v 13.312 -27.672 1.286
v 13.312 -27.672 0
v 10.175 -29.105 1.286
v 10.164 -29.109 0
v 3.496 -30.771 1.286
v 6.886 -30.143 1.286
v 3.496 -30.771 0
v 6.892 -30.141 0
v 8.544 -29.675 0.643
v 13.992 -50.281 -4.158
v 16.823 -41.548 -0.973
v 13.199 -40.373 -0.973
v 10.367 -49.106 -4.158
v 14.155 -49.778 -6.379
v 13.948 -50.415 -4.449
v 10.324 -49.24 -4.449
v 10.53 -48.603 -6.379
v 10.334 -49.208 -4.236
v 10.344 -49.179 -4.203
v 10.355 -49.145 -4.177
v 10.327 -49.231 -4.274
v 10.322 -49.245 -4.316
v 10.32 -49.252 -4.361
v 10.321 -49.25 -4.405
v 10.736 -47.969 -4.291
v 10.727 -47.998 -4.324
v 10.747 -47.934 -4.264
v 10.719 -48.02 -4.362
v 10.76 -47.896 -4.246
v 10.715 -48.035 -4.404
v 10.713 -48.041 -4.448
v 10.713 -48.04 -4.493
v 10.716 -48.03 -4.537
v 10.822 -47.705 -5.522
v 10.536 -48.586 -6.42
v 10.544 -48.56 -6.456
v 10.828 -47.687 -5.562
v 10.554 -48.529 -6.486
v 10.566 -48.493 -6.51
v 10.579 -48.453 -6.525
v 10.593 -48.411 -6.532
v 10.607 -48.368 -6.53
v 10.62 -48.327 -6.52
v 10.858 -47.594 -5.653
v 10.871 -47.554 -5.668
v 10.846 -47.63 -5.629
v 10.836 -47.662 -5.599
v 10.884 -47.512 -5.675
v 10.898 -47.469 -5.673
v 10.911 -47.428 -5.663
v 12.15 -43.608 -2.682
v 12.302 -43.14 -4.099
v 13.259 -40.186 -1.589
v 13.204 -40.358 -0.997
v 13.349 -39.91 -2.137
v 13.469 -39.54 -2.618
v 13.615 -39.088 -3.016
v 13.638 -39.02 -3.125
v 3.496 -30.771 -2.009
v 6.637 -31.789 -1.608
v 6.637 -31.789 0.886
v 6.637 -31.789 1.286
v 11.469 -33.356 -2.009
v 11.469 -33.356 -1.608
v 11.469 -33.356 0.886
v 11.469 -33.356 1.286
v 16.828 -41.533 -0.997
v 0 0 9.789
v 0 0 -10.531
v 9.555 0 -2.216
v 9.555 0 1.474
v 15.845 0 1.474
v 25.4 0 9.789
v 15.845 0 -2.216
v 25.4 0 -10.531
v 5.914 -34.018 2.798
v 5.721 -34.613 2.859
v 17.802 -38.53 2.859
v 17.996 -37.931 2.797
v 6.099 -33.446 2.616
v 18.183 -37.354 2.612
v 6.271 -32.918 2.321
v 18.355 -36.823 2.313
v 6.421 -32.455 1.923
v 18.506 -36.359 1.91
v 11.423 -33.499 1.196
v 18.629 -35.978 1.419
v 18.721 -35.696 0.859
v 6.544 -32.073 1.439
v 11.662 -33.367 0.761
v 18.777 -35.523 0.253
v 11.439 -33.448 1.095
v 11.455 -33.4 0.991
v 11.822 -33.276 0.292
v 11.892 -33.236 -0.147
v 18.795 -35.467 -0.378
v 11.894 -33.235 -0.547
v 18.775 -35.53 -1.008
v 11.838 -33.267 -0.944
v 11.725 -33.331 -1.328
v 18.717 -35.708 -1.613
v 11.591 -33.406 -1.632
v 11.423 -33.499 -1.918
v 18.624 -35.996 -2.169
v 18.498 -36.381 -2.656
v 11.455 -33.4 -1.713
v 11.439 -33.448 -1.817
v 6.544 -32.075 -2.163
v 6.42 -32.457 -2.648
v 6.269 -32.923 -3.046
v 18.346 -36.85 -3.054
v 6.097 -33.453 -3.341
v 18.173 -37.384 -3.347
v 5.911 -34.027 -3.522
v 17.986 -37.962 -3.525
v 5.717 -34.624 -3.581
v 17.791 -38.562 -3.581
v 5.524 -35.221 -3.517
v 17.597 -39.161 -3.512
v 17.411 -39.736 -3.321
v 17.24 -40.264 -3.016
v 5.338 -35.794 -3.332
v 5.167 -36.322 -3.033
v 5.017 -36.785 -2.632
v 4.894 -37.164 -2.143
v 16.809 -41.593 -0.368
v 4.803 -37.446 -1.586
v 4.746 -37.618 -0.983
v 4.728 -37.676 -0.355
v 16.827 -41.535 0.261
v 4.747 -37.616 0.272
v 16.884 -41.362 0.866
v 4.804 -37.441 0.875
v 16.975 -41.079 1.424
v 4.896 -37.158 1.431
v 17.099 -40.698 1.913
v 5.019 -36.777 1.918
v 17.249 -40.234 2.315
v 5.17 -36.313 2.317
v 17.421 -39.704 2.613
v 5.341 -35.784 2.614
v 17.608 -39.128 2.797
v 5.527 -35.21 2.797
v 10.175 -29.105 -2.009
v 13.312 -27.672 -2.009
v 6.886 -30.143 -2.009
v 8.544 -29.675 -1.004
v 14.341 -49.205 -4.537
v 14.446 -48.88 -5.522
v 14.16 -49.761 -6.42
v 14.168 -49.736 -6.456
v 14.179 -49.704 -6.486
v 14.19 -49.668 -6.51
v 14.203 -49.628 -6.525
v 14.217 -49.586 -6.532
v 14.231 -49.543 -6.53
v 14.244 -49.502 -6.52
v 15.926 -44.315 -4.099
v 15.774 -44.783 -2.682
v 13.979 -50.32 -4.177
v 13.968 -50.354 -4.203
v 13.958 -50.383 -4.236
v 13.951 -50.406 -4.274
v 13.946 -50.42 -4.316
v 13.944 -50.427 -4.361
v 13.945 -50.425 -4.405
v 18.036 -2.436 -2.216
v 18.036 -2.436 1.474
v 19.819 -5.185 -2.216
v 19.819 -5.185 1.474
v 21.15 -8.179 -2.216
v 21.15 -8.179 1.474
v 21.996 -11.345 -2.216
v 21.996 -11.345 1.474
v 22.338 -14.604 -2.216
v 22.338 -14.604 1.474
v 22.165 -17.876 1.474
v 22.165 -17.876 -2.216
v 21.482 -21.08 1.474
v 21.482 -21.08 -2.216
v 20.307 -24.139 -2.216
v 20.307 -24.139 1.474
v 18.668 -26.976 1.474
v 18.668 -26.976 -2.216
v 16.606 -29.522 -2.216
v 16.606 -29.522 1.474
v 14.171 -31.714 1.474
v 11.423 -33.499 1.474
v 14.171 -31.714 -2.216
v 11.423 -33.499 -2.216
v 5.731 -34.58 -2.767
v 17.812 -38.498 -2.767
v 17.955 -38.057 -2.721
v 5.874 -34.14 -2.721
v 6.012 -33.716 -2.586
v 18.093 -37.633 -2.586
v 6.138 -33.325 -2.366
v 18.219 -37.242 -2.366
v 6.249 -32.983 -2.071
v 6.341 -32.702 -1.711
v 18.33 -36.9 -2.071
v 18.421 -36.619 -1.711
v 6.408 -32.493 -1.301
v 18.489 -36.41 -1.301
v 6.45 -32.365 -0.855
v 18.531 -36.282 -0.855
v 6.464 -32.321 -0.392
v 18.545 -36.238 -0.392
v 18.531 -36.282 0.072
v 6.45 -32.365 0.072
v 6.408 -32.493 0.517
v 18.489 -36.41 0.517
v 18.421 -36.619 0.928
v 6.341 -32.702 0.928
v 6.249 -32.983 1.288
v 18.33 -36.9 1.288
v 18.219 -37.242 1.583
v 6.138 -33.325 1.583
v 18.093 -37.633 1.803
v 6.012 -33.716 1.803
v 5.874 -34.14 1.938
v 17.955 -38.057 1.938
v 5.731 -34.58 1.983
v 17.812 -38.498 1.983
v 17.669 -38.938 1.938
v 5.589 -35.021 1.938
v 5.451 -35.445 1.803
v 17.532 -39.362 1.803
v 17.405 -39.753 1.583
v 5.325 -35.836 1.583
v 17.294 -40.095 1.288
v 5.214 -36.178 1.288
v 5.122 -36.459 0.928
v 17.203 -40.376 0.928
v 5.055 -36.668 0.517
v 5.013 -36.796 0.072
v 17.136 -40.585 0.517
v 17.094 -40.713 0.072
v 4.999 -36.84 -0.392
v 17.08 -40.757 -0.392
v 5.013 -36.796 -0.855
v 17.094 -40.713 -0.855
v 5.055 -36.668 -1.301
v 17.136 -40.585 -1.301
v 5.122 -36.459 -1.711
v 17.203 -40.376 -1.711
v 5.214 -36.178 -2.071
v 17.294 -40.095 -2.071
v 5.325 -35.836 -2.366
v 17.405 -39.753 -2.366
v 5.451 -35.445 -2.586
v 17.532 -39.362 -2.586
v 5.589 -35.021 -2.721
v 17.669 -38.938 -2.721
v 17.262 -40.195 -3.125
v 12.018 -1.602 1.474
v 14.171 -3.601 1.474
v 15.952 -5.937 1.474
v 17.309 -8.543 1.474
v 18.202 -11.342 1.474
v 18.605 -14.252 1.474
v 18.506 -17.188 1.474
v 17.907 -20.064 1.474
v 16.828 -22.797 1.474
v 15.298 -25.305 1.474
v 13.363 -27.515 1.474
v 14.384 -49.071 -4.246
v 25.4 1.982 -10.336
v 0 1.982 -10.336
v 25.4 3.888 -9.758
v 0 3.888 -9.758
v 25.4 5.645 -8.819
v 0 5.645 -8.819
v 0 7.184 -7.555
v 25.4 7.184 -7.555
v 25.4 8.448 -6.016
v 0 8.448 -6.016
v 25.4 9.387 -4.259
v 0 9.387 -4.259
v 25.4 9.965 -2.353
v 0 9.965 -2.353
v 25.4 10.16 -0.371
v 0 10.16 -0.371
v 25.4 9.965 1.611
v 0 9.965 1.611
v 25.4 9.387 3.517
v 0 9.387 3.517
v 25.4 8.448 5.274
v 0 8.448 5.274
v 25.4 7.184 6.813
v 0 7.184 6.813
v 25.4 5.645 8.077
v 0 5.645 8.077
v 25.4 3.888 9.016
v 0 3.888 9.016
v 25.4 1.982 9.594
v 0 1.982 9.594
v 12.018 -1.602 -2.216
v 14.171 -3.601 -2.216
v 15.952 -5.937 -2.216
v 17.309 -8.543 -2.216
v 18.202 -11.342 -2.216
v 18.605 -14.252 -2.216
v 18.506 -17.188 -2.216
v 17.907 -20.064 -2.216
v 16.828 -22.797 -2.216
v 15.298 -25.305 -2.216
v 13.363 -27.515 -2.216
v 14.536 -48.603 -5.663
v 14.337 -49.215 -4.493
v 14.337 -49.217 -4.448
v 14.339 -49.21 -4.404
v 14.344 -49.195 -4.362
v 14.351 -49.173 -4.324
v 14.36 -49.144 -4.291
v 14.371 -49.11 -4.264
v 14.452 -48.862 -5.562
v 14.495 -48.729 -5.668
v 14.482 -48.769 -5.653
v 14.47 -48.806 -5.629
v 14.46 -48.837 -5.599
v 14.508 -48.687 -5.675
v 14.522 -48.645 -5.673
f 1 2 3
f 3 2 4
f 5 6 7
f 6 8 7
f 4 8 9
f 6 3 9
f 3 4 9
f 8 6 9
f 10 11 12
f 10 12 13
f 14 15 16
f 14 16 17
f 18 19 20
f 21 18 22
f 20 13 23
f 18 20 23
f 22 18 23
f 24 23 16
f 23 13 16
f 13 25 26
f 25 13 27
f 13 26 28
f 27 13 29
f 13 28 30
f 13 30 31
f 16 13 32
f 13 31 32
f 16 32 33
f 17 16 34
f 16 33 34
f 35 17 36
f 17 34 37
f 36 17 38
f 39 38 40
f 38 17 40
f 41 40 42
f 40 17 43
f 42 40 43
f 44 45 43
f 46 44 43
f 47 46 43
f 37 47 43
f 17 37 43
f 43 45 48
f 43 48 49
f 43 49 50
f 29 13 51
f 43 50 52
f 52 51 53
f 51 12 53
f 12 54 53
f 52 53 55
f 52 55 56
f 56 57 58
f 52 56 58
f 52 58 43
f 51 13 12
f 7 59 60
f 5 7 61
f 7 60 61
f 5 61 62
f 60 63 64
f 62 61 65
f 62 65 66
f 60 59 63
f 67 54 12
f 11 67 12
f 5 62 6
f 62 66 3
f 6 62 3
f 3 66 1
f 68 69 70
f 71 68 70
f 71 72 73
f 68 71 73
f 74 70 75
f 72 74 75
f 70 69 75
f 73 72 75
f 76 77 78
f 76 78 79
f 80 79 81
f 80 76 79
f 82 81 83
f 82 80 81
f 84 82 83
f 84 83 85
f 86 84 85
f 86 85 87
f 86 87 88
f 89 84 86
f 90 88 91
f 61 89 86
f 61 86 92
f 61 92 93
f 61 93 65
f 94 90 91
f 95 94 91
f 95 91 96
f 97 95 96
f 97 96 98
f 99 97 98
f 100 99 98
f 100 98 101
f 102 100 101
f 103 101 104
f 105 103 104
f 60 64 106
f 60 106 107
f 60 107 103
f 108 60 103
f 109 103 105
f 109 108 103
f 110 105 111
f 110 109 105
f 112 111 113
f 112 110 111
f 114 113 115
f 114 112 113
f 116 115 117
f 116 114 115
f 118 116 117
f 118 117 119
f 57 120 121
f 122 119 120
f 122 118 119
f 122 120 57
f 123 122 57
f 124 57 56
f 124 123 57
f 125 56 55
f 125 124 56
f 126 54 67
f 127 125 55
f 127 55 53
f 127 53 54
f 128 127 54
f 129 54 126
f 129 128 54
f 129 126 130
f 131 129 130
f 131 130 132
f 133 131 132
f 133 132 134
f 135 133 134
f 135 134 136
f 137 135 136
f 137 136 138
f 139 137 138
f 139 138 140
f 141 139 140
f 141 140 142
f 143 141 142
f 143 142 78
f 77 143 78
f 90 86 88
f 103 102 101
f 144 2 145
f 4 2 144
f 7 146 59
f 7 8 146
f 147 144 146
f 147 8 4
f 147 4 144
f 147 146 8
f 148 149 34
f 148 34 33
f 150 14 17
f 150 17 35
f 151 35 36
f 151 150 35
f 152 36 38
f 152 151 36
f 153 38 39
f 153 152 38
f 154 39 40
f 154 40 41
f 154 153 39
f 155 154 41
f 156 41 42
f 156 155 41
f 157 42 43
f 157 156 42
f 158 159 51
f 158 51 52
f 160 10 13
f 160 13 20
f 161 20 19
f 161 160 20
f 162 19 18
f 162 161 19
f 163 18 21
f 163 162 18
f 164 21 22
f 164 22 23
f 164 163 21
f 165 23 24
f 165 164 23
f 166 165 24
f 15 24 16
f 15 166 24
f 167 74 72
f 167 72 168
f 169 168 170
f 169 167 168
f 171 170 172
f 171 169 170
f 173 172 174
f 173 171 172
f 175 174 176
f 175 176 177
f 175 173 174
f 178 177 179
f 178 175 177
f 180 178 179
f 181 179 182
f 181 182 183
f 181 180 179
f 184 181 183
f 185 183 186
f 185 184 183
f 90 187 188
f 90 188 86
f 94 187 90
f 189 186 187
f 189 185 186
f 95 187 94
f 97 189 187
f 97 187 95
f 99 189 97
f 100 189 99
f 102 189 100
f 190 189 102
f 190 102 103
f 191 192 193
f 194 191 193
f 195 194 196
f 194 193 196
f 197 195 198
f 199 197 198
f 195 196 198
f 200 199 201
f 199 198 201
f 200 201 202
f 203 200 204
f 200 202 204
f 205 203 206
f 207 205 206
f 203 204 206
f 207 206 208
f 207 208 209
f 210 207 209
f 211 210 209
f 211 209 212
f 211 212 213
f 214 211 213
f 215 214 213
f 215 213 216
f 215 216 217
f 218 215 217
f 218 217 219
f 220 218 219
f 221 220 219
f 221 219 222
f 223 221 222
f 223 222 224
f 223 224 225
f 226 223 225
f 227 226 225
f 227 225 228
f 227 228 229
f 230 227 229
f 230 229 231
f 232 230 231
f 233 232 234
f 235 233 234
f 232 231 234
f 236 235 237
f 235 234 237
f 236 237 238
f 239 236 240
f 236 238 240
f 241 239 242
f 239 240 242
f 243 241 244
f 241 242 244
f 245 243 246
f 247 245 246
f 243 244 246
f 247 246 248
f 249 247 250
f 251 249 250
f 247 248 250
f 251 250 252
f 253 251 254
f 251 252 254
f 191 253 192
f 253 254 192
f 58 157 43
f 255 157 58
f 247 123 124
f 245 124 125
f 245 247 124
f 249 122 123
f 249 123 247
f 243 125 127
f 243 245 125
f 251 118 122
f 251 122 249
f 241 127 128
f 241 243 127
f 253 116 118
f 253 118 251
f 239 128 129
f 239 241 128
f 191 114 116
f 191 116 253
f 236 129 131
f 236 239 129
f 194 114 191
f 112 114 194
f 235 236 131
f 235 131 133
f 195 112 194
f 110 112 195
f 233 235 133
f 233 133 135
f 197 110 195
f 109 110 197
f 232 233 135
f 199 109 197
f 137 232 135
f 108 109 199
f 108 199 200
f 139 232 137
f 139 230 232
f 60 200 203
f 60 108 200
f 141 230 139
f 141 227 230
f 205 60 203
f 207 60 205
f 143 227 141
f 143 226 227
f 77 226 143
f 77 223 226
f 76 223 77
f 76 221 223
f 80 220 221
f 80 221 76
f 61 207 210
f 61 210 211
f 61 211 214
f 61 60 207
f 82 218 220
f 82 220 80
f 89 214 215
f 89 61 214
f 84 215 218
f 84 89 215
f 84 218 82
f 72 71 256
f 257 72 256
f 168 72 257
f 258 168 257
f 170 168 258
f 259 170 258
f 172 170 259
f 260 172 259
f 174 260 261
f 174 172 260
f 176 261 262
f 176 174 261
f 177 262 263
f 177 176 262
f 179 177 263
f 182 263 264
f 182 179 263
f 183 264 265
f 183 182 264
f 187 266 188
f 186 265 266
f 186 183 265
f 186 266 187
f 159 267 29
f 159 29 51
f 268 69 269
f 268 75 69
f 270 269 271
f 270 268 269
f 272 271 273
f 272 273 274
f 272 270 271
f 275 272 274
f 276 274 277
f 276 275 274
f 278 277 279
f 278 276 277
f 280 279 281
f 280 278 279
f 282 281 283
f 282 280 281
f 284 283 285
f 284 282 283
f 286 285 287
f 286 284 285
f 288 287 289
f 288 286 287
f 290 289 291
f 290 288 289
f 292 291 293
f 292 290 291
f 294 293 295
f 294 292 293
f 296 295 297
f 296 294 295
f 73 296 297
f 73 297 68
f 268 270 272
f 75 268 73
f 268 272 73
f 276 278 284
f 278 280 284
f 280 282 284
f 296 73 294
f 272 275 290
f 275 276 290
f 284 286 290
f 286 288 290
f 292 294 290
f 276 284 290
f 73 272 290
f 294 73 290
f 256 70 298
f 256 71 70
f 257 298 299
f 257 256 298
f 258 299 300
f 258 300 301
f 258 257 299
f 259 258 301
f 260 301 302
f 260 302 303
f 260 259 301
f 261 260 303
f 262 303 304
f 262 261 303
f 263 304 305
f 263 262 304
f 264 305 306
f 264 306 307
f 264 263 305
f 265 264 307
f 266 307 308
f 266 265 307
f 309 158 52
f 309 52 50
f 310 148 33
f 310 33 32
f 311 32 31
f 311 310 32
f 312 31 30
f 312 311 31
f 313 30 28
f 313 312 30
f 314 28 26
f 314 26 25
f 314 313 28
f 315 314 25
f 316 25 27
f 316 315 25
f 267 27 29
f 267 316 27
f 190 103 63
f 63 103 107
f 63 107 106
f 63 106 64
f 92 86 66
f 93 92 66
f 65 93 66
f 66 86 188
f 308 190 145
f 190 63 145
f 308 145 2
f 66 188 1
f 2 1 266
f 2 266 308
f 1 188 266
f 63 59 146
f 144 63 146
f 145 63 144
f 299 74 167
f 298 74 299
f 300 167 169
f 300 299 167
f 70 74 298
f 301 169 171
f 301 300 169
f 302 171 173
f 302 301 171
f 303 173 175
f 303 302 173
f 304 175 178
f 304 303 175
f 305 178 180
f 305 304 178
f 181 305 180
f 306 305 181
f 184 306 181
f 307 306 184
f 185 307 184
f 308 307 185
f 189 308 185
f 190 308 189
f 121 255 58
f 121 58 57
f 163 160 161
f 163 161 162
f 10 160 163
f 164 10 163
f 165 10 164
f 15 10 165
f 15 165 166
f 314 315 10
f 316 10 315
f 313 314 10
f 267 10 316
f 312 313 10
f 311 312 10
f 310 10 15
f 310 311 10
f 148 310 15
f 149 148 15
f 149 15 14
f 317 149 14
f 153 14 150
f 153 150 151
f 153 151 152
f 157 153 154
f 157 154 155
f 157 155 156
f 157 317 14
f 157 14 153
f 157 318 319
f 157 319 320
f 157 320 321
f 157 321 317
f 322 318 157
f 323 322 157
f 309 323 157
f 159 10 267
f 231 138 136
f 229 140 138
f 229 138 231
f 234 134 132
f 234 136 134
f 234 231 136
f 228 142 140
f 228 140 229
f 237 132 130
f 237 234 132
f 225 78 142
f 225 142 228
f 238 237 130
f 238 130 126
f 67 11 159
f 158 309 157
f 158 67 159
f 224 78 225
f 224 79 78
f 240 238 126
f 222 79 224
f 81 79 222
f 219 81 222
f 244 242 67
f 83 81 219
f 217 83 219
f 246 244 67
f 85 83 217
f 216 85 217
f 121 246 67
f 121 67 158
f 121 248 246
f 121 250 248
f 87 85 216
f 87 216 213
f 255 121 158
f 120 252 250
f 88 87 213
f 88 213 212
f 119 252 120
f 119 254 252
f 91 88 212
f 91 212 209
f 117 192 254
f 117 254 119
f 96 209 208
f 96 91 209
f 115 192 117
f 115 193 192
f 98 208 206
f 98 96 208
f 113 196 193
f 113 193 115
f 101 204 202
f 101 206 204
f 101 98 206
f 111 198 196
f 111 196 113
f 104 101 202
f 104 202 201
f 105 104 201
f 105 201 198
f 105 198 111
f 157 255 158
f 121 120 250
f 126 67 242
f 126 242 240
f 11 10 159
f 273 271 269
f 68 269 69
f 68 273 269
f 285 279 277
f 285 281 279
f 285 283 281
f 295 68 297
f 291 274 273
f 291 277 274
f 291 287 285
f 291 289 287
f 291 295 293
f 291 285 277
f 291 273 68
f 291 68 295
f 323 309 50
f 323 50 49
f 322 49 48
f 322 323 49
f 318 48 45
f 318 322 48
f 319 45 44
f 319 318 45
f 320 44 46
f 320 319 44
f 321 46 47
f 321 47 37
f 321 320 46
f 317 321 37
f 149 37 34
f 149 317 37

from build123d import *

# Parameters (mm, degrees)
SKETCH1_W               = 25.4
SKETCH1_H               = 10.16
REVOLVE1_ANGLE          = 180
SKETCH4_W               = 6.29000012
SKETCH4_H               = 3.69
SKETCH6_W               = 3.294985449
SKETCH6_H               = 5.974962046
BOSS_EXTRUDE1_DEPTH     = 5.08
SKETCH7_R               = 3.22
BOSS_EXTRUDE7_DEPTH     = 12.7
SKETCH9_W               = 3.294985449
SKETCH9_H               = 5.974962046
BOSS_EXTRUDE8_DEPTH     = 3.302
CUT_EXTRUDE1_DEPTH      = 3.302
CUT_EXTRUDE1_DEPTH_BACK = 3.302
SKETCH11_R              = 2.375
CUT_EXTRUDE2_DEPTH      = 2.54
CUT_EXTRUDE2_DEPTH_BACK = 12.446
BOSS_EXTRUDE14_DEPTH    = 3.81
SKETCH15_R              = 2.375
CUT_EXTRUDE3_DEPTH      = 22.352


with BuildPart() as part:
    # Sketch1 → Revolve1 (revolve)
    with BuildSketch(Plane(origin=(0, 0, 0), x_dir=(1, 0, 0), z_dir=(0, 1, 0))):
        with Locations((12.7, 5.451011236)):
            Rectangle(SKETCH1_W, SKETCH1_H)
    revolve(axis=Axis((0, 0, -0.371011236), (1, 0, 0)), revolution_arc=REVOLVE1_ANGLE)

    # Sweep1: sweep along a path in Sketch5
    with BuildLine(Plane.XY) as sweep1_path:
        ThreePointArc((12.7, 0), (20.315428689, -15.331843414), (12.392600359, -30.5071183))
    # Sketch4 → Sweep1 (sweep)
    with BuildSketch(Plane(origin=(0, 0, 0), x_dir=(1, 0, 0), z_dir=(0, 1, 0))):
        with Locations((12.7, 0.371011236)):
            Rectangle(SKETCH4_W, SKETCH4_H)
    sweep(path=sweep1_path.line)

    # Sketch6 → Boss-Extrude1 (add)
    with BuildSketch(Plane(origin=(20.164340987, -6.538110874, 0), x_dir=(0, 0, 1), z_dir=(-0.95124601, 0.308433183, 0))):
        with Locations((-0.361104817, -25.204906835)):
            Rectangle(SKETCH6_W, SKETCH6_H)
    extrude(amount=BOSS_EXTRUDE1_DEPTH)

    # Sketch7 → Boss-Extrude7 (add)
    with BuildSketch(Plane(origin=(15.332011256, -4.971270302, 0), x_dir=(0, 0, 1), z_dir=(-0.95124601, 0.308433183, 0))):
        with Locations((-0.361104816, -31.160979548)):
            Circle(SKETCH7_R)
    extrude(amount=-BOSS_EXTRUDE7_DEPTH)

    # Sketch9 → Boss-Extrude8 (add)
    with BuildSketch(Plane(origin=(15.332011256, -4.971270302, 0), x_dir=(0, 0, 1), z_dir=(-0.95124601, 0.308433183, 0))):
        with Locations((-0.361104817, -25.204906835)):
            Rectangle(SKETCH9_W, SKETCH9_H)
    extrude(amount=BOSS_EXTRUDE8_DEPTH)

    # Sketch10 → Cut-Extrude1 (cut, two sides)
    with BuildSketch(Plane.XY) as cut_extrude1_sk:
        with BuildLine():
            Line((3.495528998, -30.770720391), (5.338405562, -25.087061585))
            Line((5.338405562, -25.087061585), (13.311749617, -27.672348528))
            add(Edge.make_bspline(
                [(13.311749617, -27.672348528), (8.683653097, -30.129373505), (3.495528998, -30.770720391)],
                knots=[0, 0, 0, 1, 1, 1], degree=2))
        make_face()
    extrude(amount=CUT_EXTRUDE1_DEPTH, mode=Mode.SUBTRACT)
    extrude(cut_extrude1_sk.sketch, amount=-CUT_EXTRUDE1_DEPTH_BACK, mode=Mode.SUBTRACT)

    # Sketch11 → Cut-Extrude2 (cut, two sides)
    with BuildSketch(Plane(origin=(27.412835582, -8.888371731, 0), x_dir=(0, 0, -1), z_dir=(0.95124601, -0.308433183, 0))) as cut_extrude2_sk:
        with Locations((0.39169909, -31.12675273)):
            Circle(SKETCH11_R)
    extrude(amount=CUT_EXTRUDE2_DEPTH, mode=Mode.SUBTRACT)
    extrude(cut_extrude2_sk.sketch, amount=-CUT_EXTRUDE2_DEPTH_BACK, mode=Mode.SUBTRACT)

    # Sketch13 → Boss-Extrude14 (add)
    with BuildSketch(Plane(origin=(27.412835582, -8.888371731, 0), x_dir=(0, 0, -1), z_dir=(0.95124601, -0.308433183, 0))):
        with BuildLine():
            Line((6.519856112, -42.694953789), (3.125271975, -32.910924296))
            Line((3.125271975, -32.910924296), (0.972674671, -34.333593678))
            Line((0.972674671, -34.333593678), (4.157973921, -43.514412461))
            ThreePointArc((4.157973921, -43.514412461), (4.274214649, -43.645179802), (4.448875729, -43.655451668))
            Line((4.448875729, -43.655451668), (6.378816905, -42.985855597))
            ThreePointArc((6.378816905, -42.985855597), (6.509584246, -42.869614869), (6.519856112, -42.694953789))
        make_face()
        with BuildLine():
            Line((4.098849122, -37.242411221), (5.662835166, -41.750205096))
            ThreePointArc((5.662835166, -41.750205096), (5.6525633, -41.924866176), (5.521795959, -42.041106905))
            Line((5.521795959, -42.041106905), (4.53660766, -42.382919506))
            ThreePointArc((4.53660766, -42.382919506), (4.361946579, -42.37264764), (4.245705851, -42.241880299))
            Line((4.245705851, -42.241880299), (2.681719808, -37.734086425))
            Line((2.681719808, -37.734086425), (4.098849122, -37.242411221))
        make_face(mode=Mode.SUBTRACT)
    extrude(amount=-BOSS_EXTRUDE14_DEPTH)

    # Sketch15 → Cut-Extrude3 (cut)
    with BuildSketch(Plane(origin=(27.412835582, -8.888371731, 0), x_dir=(0, 0, -1), z_dir=(0.95124601, -0.308433183, 0))):
        with Locations((0.39169909, -31.12675273)):
            Circle(SKETCH15_R)
    extrude(amount=-CUT_EXTRUDE3_DEPTH, mode=Mode.SUBTRACT)


solid = part.part
